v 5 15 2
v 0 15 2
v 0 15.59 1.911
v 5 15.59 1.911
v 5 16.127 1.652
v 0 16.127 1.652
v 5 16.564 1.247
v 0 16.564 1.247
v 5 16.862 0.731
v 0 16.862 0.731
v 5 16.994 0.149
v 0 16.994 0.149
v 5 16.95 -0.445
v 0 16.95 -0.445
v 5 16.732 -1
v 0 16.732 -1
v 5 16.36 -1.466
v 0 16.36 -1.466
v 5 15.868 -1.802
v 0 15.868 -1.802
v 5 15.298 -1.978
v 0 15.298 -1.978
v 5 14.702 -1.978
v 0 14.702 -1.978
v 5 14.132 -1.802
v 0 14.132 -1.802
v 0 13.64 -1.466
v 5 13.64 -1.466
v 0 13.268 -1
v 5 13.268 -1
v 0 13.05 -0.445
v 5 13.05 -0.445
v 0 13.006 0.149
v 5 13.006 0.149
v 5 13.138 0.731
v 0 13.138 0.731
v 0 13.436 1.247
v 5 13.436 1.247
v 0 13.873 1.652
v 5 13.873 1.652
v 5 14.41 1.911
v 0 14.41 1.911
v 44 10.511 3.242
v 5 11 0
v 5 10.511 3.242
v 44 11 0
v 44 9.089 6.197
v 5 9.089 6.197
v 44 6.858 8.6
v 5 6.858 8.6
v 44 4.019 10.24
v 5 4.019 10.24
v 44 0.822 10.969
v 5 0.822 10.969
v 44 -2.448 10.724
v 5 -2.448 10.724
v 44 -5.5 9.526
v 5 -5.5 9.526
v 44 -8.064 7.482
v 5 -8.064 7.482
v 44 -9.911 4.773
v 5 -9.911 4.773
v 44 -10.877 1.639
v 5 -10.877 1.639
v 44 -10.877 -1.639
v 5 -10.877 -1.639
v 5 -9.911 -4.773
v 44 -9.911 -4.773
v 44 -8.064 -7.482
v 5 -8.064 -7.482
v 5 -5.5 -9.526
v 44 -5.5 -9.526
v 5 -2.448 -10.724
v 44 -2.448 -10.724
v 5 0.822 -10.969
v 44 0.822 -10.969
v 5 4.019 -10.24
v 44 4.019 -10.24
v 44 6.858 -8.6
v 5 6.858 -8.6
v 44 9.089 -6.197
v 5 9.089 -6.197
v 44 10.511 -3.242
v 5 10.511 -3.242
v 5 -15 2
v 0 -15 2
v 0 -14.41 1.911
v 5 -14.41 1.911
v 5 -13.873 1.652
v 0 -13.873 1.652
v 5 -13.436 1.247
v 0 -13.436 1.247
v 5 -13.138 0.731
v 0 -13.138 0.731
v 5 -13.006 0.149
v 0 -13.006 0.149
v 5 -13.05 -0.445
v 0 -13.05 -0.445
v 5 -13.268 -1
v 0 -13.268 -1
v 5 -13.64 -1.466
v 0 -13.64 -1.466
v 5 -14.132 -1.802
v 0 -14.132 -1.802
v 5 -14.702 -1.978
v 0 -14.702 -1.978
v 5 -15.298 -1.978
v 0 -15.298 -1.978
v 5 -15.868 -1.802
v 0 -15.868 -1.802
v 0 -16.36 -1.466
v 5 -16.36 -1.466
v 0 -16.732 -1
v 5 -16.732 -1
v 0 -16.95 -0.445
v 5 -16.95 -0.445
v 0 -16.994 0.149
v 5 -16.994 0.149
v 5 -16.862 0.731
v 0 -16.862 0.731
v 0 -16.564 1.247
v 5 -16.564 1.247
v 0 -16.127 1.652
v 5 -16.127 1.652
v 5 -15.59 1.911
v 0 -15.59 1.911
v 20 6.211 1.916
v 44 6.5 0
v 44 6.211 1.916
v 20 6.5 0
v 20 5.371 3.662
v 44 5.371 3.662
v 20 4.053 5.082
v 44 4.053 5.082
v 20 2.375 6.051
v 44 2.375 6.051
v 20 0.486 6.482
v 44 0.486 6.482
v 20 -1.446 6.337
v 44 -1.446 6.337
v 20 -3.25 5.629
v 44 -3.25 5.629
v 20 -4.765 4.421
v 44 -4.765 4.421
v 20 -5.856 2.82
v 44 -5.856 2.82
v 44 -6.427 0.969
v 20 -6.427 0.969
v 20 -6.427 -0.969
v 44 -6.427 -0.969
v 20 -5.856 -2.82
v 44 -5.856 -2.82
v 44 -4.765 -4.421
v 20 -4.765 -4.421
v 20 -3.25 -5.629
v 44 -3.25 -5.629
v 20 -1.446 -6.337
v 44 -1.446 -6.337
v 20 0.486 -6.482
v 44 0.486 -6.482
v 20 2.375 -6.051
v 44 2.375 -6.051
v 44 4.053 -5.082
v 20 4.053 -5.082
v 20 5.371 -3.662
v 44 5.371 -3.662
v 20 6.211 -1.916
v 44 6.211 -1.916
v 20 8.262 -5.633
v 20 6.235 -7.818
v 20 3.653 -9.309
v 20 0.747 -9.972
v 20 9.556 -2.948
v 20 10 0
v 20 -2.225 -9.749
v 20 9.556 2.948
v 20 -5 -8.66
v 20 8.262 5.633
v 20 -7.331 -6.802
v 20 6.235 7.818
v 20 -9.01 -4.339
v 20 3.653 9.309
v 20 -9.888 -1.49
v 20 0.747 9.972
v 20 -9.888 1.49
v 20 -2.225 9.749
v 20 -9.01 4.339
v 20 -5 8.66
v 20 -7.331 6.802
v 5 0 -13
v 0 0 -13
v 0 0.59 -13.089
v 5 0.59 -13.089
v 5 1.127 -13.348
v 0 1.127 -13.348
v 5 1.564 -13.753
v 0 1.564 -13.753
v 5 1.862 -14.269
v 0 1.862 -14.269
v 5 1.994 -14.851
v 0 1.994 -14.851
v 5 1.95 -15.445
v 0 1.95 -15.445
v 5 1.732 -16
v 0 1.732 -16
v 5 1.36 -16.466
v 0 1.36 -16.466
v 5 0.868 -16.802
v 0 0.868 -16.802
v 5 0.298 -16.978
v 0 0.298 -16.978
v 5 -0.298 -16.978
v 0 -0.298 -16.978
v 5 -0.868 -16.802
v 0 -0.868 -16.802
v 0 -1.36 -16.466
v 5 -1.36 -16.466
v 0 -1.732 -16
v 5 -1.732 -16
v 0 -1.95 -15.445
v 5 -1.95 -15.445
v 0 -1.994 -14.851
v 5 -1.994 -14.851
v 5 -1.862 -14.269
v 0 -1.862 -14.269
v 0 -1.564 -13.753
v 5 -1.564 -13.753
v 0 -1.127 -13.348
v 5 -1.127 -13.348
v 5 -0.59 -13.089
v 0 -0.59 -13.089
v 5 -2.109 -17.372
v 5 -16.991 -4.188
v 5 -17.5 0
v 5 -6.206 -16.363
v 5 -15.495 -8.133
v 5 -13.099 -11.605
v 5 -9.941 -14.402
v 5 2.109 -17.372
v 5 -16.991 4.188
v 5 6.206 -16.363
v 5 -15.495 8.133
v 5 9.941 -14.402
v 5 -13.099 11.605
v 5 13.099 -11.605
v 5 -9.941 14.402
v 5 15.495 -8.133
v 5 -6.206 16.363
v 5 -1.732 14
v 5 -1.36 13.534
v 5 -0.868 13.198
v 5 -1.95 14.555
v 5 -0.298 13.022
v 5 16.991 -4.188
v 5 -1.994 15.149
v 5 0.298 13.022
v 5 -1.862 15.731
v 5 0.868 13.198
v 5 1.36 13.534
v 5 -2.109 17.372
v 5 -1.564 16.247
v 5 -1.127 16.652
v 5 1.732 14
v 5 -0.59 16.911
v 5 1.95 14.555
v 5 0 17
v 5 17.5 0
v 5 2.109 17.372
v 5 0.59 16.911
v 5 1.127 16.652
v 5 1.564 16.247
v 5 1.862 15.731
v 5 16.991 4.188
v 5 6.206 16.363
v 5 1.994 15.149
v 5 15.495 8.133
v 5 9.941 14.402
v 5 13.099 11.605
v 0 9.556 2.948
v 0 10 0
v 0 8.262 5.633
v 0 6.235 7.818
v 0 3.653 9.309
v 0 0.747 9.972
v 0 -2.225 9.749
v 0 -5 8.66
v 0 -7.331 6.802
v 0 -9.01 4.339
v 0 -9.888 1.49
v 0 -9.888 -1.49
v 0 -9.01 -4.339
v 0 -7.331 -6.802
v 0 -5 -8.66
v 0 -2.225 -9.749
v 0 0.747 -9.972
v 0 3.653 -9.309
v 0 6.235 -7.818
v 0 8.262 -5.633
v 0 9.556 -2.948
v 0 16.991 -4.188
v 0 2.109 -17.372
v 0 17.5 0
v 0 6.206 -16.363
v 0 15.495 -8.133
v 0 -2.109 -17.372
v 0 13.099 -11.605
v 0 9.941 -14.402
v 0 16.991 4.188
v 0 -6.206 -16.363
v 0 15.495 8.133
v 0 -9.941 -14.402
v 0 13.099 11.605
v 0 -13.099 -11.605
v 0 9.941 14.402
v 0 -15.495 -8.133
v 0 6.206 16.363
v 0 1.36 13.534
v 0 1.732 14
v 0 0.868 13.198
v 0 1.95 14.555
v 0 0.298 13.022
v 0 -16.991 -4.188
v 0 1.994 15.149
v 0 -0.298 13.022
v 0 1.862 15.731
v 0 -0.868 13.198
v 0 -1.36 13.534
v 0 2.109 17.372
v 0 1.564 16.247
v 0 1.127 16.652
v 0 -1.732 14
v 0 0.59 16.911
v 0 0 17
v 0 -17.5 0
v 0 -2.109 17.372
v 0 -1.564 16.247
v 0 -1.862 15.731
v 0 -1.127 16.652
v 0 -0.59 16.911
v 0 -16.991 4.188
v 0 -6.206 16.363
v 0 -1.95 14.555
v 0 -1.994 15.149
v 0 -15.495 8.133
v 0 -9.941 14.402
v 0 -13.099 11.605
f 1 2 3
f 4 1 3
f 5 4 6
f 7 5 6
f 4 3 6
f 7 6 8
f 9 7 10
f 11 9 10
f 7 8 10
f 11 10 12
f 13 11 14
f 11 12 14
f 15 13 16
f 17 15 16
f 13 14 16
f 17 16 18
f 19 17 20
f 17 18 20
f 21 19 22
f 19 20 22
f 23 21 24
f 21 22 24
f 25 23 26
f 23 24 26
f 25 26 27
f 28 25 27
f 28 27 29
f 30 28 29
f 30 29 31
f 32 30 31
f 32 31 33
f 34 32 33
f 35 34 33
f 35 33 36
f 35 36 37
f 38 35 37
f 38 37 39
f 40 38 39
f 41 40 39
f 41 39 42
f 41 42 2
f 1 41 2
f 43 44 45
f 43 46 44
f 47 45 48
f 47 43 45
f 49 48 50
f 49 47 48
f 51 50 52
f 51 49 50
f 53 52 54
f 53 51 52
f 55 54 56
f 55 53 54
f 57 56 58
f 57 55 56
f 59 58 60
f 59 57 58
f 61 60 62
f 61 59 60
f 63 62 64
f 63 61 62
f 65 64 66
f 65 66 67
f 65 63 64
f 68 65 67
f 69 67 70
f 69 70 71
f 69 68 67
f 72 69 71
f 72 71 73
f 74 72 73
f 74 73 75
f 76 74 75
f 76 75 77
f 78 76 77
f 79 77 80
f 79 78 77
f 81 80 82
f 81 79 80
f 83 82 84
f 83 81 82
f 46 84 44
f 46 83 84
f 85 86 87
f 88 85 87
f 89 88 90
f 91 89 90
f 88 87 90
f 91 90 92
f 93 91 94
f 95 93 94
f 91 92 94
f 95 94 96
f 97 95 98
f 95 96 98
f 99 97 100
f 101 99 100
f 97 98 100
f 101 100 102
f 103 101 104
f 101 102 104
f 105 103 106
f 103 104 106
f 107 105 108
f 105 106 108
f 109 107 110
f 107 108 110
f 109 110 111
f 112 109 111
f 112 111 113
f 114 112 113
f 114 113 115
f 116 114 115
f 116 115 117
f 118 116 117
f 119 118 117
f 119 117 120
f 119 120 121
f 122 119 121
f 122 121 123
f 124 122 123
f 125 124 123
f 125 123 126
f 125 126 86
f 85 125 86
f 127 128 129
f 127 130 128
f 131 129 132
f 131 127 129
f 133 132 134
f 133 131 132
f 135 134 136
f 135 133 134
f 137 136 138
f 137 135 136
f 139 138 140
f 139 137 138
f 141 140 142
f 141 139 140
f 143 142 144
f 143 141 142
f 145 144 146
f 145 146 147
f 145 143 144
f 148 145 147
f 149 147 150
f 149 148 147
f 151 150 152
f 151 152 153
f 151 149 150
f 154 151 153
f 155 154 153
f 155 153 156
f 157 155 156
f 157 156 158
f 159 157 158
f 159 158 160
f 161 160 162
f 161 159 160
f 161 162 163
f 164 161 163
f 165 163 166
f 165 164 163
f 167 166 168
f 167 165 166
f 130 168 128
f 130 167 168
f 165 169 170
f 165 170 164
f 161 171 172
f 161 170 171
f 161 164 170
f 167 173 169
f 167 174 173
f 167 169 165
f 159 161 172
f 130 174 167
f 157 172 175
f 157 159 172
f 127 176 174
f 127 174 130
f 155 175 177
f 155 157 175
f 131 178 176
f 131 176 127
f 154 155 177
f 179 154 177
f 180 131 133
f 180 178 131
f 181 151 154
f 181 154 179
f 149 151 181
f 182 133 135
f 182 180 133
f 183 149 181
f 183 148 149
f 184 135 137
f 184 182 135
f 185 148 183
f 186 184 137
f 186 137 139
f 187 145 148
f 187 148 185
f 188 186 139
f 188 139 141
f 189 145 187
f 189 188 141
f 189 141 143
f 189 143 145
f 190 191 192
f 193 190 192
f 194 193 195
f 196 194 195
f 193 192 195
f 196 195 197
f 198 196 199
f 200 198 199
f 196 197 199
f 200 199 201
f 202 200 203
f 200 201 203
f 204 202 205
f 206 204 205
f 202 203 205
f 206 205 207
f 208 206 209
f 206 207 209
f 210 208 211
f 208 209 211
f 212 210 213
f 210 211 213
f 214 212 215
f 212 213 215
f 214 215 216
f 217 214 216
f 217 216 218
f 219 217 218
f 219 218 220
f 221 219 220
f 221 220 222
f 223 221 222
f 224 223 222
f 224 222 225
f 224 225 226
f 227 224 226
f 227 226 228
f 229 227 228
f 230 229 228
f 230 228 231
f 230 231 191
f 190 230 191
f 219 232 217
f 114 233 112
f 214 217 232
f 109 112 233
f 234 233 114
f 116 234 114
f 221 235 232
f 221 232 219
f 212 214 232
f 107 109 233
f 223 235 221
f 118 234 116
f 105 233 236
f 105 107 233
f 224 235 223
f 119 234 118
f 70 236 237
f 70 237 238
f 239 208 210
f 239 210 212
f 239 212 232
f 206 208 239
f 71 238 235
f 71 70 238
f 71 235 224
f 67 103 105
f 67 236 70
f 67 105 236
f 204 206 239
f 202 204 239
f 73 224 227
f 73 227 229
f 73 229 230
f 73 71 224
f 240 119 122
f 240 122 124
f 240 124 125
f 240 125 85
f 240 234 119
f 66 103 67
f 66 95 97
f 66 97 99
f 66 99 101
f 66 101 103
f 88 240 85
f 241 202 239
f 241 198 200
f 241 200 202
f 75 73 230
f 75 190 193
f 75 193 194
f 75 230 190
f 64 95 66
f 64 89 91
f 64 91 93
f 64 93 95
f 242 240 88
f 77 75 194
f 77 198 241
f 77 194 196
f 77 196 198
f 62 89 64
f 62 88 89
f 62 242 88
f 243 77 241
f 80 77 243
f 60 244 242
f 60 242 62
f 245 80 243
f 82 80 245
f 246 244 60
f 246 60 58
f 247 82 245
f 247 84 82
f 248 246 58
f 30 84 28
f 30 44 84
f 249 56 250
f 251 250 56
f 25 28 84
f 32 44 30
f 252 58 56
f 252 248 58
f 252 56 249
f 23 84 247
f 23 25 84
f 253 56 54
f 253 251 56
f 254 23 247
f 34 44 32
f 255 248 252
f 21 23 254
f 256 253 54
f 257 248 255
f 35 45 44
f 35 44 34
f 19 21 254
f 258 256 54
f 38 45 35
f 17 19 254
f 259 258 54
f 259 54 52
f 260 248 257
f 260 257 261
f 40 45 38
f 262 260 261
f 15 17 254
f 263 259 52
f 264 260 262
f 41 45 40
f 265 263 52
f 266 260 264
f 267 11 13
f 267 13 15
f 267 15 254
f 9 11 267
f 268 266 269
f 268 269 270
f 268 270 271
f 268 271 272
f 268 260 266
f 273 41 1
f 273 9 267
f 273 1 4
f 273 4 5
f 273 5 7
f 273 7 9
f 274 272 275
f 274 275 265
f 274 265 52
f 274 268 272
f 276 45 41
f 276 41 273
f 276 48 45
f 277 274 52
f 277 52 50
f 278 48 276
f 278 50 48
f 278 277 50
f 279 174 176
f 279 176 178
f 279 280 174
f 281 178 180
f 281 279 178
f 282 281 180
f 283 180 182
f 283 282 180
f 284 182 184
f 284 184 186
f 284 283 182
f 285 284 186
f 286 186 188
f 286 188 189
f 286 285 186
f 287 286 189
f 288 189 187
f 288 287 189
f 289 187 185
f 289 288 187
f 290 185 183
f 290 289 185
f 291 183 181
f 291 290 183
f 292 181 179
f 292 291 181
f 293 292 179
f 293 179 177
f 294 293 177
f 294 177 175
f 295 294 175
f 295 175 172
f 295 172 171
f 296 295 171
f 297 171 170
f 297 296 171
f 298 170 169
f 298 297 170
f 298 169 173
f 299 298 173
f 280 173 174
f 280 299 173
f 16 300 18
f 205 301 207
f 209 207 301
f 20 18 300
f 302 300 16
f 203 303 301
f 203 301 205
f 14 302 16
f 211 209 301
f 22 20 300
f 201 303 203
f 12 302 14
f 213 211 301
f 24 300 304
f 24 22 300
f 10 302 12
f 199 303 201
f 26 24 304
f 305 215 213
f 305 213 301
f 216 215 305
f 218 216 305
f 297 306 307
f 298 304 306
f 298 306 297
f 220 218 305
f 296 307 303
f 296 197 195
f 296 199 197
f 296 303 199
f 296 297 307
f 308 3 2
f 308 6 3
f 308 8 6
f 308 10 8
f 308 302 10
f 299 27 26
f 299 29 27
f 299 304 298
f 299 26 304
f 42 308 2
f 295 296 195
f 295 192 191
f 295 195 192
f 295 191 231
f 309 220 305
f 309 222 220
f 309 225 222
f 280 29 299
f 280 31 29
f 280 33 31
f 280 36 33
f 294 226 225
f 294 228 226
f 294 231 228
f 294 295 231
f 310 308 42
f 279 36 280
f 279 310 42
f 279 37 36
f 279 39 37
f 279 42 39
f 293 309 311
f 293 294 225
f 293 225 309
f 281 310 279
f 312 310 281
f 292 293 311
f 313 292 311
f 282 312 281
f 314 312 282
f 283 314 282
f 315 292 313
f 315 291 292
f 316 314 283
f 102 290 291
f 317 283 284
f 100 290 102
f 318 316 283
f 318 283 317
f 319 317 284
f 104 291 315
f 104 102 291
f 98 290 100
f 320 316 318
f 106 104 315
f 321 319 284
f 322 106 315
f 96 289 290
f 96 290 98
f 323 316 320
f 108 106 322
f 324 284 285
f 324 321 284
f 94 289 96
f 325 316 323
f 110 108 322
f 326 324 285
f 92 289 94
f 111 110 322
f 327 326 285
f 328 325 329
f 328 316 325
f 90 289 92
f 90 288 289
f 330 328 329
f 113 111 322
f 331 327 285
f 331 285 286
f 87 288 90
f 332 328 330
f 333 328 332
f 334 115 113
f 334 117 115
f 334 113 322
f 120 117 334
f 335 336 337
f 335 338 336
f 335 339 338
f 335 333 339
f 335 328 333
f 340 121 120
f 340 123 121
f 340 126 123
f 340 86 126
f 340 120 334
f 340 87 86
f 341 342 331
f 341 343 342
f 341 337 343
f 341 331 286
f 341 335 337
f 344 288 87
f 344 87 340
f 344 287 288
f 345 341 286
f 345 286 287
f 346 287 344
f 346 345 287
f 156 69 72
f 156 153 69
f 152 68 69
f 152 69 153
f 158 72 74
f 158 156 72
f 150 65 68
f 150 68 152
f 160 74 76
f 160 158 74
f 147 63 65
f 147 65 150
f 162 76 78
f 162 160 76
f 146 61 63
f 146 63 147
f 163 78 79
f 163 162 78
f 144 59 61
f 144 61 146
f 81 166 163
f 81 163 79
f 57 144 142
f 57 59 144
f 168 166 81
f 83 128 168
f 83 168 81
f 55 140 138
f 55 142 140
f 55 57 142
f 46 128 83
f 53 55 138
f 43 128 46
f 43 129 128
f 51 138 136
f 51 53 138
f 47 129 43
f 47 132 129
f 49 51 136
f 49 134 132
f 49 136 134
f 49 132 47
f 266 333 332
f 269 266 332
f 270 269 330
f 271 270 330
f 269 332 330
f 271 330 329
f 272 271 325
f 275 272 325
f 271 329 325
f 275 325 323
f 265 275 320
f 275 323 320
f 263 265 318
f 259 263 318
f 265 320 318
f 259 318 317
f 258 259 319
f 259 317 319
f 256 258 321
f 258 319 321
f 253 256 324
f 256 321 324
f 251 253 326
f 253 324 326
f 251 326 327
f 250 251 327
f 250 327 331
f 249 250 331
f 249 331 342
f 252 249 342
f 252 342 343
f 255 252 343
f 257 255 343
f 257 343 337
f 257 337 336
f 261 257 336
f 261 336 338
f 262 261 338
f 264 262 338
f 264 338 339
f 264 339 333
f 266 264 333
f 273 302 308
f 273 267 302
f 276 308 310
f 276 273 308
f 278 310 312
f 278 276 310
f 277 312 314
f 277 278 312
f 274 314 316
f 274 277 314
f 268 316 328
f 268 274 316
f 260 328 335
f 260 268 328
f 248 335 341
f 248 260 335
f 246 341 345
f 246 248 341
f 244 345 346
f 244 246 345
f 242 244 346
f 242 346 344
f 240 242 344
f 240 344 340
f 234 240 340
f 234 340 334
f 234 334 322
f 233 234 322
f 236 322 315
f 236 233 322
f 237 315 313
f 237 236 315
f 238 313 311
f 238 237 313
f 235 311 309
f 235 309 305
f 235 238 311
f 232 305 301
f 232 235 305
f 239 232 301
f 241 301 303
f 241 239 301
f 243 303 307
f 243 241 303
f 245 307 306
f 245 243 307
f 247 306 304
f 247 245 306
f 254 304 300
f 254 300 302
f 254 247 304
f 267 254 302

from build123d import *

# Parameters (mm, degrees)
ESQUISSE2_R      = 2
EXTRUSION1_DEPTH = 45


with BuildPart() as part:
    # Esquisse1 → Révolution1 (revolve)
    with BuildSketch(Plane.XY):
        Polygon((0, 10), (0, 17.5), (5, 17.5), (5, 11), (44, 11), (44, 6.5), (20, 6.5), (20, 10), align=None)
    revolve(axis=Axis((0, 0, 0), (1, 0, 0)))

    # Esquisse2 → Extrusion1 (cut, through all)
    with BuildSketch(Plane.ZY):
        with Locations((0, 15)):
            Circle(ESQUISSE2_R)
        with Locations((15, 0)):
            Circle(ESQUISSE2_R)
        with Locations((0, -15)):
            Circle(ESQUISSE2_R)
        with Locations((-15, 0)):
            Circle(ESQUISSE2_R)
    extrude(amount=-EXTRUSION1_DEPTH, mode=Mode.SUBTRACT)


solid = part.part
